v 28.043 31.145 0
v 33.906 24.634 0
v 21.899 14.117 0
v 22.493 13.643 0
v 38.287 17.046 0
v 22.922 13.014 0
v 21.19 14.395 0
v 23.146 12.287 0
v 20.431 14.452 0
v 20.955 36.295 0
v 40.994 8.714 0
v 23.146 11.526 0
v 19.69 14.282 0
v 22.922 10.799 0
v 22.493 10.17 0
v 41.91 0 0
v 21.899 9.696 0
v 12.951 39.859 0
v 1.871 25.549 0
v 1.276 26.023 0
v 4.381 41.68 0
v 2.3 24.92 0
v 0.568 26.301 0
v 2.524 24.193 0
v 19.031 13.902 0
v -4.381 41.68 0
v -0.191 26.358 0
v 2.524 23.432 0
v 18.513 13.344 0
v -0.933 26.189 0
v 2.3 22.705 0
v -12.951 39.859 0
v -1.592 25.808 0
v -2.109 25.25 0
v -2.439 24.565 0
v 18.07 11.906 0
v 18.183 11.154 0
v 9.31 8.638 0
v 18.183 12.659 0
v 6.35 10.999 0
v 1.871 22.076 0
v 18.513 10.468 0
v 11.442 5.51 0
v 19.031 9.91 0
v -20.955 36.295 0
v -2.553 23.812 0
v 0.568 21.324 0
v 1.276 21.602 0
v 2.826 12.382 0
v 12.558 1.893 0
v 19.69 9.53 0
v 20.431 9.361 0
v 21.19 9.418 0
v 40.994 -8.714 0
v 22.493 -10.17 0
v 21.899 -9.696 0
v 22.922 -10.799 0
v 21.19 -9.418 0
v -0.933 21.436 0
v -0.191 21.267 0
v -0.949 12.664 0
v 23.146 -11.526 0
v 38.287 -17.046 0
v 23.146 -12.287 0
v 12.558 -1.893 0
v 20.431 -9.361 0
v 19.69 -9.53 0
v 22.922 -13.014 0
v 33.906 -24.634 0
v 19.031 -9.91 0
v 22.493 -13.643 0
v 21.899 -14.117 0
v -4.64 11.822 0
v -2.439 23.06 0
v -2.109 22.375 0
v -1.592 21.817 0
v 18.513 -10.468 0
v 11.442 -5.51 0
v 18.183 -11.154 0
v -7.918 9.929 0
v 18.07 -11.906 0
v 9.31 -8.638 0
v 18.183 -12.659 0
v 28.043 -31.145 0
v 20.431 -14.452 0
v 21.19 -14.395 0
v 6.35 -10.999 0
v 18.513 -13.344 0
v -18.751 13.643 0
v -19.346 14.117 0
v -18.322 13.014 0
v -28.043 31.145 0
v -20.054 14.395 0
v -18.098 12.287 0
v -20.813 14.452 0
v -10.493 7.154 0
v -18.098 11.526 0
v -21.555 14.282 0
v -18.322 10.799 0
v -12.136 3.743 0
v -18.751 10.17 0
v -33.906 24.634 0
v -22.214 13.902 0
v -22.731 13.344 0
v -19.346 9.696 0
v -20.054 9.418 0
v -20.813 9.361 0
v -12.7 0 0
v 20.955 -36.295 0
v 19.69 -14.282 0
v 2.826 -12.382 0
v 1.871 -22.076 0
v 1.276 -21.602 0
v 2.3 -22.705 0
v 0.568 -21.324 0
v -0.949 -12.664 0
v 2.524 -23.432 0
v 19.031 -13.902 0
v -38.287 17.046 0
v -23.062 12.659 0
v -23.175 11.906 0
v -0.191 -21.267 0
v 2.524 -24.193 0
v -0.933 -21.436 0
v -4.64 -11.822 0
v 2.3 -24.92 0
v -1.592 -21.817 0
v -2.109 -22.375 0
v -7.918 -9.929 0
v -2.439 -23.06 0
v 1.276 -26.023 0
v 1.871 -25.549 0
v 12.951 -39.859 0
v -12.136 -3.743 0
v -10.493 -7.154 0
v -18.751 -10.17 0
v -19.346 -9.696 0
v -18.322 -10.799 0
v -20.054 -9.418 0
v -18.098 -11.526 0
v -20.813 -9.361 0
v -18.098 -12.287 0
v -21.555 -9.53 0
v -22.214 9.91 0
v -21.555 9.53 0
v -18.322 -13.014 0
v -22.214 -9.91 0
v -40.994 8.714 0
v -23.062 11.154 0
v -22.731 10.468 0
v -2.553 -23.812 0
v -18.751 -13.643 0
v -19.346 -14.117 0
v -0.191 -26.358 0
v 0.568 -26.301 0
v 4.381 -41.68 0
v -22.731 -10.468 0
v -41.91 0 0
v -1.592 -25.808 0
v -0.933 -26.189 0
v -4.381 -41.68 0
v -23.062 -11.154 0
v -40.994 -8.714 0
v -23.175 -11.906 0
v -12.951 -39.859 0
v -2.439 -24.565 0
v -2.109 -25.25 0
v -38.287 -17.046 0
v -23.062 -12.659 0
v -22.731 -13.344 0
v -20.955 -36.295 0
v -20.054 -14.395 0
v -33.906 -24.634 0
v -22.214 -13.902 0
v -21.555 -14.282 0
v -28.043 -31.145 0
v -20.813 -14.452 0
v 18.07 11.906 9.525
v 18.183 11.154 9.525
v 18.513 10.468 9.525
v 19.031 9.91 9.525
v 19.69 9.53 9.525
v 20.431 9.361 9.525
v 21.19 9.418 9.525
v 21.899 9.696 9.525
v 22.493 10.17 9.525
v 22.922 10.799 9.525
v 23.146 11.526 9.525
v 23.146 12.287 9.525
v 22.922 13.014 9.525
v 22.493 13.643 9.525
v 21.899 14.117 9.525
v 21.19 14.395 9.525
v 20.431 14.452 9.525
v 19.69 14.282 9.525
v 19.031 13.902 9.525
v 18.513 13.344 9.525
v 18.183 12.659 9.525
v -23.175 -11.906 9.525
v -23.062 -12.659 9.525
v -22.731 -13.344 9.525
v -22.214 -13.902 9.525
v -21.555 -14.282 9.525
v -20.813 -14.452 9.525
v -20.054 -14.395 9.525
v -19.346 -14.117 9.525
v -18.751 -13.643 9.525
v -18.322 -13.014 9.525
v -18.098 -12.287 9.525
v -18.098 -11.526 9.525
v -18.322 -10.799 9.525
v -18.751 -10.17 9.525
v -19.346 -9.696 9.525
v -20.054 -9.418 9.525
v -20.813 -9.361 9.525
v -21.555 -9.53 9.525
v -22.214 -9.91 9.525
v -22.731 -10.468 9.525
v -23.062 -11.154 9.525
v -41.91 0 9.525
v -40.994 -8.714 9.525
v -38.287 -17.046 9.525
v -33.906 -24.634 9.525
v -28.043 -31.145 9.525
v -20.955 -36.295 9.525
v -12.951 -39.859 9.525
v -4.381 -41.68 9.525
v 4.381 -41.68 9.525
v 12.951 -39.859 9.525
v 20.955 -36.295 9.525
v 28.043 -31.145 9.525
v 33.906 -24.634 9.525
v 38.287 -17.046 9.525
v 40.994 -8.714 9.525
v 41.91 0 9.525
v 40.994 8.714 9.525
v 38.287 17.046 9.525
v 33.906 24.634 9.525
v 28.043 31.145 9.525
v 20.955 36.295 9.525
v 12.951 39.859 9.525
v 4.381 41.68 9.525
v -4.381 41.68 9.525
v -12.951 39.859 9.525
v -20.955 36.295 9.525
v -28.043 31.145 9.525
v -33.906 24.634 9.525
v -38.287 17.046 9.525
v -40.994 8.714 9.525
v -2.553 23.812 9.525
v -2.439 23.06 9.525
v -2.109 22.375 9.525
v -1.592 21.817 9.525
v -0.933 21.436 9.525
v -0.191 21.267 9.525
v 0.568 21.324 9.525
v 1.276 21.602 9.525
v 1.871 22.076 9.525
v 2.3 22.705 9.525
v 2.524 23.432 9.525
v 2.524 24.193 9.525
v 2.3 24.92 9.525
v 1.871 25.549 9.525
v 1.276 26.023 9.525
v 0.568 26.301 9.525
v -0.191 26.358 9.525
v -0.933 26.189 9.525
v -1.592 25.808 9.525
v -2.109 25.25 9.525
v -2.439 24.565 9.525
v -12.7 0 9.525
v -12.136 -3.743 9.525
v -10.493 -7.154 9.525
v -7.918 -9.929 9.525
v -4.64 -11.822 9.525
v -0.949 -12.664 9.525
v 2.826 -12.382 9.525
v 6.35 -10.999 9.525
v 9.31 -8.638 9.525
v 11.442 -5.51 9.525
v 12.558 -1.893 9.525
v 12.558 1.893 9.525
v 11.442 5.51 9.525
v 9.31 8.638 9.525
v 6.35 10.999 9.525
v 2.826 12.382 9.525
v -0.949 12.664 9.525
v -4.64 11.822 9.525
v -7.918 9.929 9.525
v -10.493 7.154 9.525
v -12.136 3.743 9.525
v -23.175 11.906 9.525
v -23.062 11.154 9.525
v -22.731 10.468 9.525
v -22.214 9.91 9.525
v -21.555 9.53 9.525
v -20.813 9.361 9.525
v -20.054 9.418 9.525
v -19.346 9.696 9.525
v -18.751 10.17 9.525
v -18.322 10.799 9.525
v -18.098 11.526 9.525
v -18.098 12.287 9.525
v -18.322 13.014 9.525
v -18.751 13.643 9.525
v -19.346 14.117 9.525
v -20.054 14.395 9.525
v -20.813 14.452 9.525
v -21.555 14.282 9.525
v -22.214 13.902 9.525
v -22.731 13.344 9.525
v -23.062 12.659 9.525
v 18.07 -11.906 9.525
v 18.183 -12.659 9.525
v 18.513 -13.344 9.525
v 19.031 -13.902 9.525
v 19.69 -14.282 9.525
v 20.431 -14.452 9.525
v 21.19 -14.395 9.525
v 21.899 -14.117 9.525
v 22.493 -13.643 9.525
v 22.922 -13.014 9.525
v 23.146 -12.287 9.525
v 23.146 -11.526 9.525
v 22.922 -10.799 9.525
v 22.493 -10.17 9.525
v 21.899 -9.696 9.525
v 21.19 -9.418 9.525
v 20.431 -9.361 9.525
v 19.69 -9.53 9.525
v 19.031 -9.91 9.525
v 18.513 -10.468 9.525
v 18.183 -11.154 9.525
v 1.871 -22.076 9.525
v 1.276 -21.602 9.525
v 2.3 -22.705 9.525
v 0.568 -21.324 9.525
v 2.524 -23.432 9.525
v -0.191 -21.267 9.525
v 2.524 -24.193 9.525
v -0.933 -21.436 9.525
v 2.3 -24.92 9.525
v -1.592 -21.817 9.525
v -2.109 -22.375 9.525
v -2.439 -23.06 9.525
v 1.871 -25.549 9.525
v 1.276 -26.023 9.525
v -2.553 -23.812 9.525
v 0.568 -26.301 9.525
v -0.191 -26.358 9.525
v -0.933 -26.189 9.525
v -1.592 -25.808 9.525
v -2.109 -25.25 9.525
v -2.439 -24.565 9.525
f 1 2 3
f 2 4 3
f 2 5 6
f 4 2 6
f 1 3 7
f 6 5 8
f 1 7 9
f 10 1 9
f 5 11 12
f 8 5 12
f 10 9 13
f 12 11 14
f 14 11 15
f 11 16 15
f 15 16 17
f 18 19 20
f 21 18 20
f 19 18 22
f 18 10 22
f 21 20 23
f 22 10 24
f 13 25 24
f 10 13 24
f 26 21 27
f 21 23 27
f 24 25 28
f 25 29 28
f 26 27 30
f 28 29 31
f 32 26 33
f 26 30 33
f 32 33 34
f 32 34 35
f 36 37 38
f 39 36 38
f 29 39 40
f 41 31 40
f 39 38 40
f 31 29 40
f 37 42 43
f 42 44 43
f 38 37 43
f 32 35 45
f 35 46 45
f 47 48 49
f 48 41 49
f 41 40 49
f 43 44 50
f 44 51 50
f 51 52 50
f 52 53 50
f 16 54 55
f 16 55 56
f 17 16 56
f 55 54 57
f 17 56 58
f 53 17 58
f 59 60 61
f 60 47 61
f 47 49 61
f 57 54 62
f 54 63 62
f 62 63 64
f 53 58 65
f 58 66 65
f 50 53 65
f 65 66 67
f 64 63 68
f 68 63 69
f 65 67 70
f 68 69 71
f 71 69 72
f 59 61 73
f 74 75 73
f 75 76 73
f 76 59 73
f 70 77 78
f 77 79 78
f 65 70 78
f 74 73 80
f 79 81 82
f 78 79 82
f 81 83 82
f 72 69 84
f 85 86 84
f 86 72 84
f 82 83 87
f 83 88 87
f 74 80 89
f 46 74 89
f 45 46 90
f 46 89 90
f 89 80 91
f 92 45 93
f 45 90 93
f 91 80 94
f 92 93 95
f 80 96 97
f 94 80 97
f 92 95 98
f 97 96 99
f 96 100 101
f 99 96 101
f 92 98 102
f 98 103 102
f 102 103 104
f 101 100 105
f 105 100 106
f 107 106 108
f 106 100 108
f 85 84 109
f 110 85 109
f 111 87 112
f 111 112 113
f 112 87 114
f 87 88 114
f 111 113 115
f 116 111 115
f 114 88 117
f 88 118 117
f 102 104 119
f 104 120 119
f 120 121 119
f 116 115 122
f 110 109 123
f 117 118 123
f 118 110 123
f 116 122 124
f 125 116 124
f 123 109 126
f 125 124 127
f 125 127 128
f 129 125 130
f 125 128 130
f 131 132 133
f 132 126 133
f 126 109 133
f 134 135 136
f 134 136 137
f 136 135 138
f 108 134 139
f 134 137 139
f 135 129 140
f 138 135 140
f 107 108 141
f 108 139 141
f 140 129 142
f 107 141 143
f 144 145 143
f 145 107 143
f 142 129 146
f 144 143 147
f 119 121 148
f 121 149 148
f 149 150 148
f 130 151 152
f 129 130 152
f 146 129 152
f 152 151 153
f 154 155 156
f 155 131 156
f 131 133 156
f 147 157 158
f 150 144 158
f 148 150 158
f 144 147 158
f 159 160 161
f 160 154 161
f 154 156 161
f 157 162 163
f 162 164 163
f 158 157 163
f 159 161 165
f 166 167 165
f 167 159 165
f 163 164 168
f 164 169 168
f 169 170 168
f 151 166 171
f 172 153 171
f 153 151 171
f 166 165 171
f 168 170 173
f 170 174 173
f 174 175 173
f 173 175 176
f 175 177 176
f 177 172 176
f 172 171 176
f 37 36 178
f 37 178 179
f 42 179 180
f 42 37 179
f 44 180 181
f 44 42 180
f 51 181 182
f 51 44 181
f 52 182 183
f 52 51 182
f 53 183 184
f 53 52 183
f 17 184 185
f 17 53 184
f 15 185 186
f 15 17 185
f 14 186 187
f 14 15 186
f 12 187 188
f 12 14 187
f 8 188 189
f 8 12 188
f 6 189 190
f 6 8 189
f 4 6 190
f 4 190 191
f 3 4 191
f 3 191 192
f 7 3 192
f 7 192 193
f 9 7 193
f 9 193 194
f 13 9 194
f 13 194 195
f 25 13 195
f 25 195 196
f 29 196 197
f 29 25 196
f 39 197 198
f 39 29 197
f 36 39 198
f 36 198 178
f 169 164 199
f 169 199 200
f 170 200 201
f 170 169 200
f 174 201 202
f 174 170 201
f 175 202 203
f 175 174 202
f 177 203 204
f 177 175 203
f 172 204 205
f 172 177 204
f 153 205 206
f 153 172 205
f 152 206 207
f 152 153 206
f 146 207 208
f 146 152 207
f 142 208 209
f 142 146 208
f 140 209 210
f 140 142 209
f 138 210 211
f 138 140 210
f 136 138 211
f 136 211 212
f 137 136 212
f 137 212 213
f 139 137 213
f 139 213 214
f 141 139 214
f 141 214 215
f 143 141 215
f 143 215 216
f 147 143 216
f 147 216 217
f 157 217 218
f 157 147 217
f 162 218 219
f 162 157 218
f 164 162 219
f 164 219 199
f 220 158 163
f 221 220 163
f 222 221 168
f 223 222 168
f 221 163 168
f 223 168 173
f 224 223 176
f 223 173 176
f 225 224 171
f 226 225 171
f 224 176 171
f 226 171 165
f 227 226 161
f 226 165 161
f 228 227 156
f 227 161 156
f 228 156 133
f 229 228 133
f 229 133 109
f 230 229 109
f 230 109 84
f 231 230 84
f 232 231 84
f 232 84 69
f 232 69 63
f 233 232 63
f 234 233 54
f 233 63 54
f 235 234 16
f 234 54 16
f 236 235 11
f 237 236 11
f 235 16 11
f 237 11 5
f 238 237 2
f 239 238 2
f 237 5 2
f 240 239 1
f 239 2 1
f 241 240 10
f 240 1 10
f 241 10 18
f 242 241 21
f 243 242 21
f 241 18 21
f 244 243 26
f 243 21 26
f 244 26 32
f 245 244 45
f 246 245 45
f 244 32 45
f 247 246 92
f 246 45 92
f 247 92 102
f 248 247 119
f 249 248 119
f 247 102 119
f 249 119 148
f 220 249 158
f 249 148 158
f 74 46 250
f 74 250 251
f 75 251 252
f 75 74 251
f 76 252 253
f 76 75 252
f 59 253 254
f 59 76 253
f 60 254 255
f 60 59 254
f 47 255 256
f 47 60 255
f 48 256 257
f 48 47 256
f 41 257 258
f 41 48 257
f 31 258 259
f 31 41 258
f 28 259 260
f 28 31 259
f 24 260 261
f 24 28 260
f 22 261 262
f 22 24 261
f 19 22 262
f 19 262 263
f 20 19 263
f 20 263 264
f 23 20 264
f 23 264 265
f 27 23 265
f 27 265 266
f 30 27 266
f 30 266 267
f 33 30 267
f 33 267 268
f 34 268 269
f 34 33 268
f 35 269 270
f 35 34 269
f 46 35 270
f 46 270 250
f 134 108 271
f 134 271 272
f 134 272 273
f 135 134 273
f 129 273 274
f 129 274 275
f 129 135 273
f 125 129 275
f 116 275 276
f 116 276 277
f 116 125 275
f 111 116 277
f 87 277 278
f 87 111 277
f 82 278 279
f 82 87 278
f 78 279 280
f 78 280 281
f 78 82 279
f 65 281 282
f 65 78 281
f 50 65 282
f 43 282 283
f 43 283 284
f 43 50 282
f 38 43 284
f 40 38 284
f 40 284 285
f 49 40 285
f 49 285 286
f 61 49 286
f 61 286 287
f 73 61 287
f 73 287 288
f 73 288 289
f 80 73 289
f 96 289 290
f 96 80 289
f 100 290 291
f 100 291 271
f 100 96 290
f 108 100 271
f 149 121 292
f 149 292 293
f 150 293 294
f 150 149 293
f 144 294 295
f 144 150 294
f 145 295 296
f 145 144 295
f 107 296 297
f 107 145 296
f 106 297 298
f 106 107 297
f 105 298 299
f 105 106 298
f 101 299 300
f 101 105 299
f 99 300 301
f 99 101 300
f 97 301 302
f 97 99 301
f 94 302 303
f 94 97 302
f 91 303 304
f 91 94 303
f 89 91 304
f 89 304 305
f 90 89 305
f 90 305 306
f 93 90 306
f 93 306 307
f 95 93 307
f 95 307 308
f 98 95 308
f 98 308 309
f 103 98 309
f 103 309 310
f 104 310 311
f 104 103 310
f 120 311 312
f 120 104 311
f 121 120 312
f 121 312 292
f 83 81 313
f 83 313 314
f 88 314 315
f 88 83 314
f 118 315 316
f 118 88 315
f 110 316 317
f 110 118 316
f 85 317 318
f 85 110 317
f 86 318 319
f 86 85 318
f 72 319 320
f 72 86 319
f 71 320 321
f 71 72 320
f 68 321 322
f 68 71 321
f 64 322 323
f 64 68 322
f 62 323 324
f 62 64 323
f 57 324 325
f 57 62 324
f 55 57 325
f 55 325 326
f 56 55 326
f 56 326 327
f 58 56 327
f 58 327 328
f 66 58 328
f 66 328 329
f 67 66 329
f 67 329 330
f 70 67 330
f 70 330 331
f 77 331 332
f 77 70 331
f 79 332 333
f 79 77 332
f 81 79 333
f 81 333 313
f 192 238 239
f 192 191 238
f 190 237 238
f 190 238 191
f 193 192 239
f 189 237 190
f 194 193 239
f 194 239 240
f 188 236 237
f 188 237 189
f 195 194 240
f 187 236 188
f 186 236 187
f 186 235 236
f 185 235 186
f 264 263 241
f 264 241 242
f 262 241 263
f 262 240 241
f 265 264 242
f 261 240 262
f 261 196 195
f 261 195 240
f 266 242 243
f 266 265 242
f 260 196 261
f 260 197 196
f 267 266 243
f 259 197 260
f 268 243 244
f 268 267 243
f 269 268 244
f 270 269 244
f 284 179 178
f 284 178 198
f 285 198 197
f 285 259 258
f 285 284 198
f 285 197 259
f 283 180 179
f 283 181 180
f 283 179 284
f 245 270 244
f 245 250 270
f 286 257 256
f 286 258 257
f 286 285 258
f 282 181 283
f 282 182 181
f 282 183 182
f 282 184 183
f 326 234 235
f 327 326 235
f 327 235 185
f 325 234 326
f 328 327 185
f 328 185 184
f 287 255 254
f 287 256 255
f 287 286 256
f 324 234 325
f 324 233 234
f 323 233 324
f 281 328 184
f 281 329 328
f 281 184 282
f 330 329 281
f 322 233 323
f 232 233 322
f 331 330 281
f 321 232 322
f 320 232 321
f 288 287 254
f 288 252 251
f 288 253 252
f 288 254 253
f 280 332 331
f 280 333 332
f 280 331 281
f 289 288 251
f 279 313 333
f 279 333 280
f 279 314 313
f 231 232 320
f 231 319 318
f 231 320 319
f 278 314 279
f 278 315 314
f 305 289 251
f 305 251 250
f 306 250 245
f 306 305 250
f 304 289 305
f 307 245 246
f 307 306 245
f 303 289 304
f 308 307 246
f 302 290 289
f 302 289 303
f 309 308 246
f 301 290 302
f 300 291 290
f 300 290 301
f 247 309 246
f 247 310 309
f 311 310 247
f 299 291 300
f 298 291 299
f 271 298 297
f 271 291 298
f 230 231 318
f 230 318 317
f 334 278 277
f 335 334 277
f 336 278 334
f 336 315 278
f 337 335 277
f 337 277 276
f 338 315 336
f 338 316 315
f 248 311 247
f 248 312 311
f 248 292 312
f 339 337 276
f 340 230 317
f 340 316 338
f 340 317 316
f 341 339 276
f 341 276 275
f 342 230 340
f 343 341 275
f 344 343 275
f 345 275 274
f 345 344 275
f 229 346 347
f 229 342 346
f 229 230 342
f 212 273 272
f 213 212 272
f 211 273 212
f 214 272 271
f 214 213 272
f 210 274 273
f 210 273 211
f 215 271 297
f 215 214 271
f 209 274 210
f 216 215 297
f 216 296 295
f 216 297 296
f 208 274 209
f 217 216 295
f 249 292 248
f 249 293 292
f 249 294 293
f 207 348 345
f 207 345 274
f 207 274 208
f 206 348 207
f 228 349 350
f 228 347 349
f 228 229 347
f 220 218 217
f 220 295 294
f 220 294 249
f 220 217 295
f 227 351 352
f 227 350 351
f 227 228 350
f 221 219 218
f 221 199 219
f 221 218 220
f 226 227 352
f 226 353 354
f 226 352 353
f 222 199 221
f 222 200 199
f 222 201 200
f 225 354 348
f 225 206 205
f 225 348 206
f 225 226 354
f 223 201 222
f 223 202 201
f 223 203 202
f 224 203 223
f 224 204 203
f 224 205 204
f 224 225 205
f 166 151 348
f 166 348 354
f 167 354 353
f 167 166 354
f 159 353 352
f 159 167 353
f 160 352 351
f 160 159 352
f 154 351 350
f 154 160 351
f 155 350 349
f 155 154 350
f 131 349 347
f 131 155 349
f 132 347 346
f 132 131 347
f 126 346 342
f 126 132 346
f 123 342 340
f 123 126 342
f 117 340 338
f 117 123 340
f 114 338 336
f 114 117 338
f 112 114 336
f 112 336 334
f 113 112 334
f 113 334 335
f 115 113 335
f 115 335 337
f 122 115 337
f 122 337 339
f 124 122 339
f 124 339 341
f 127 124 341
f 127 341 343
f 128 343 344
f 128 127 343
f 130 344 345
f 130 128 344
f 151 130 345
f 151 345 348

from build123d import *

# Parameters (mm, degrees)
SKETCH1_R           = 41.91
SKETCH1_R_2         = 2.5527
SKETCH1_R_3         = 12.7
BOSS_EXTRUDE1_DEPTH = 9.525


with BuildPart() as part:
    # Sketch1 → Boss-Extrude1 (new body)
    with BuildSketch(Plane.XY):
        with Locations(Location((0, 0, 0), (0, 0, 180))):
            Circle(SKETCH1_R)
        with Locations(Location((0, 23.8125, 0), (0, 0, 180))):
            Circle(SKETCH1_R_2, mode=Mode.SUBTRACT)
        with Locations(Location((20.622229928, 11.90625, 0), (0, 0, 180))):
            Circle(SKETCH1_R_2, mode=Mode.SUBTRACT)
        with Locations(Location((20.622229928, -11.90625, 0), (0, 0, 180))):
            Circle(SKETCH1_R_2, mode=Mode.SUBTRACT)
        with Locations(Location((0, -23.8125, 0), (0, 0, 180))):
            Circle(SKETCH1_R_2, mode=Mode.SUBTRACT)
        with Locations(Location((-20.622229928, -11.90625, 0), (0, 0, 180))):
            Circle(SKETCH1_R_2, mode=Mode.SUBTRACT)
        with Locations(Location((-20.622229928, 11.90625, 0), (0, 0, 180))):
            Circle(SKETCH1_R_2, mode=Mode.SUBTRACT)
        with Locations(Location((0, 0, 0), (0, 0, 180))):
            Circle(SKETCH1_R_3, mode=Mode.SUBTRACT)
    extrude(amount=BOSS_EXTRUDE1_DEPTH)


solid = part.part
